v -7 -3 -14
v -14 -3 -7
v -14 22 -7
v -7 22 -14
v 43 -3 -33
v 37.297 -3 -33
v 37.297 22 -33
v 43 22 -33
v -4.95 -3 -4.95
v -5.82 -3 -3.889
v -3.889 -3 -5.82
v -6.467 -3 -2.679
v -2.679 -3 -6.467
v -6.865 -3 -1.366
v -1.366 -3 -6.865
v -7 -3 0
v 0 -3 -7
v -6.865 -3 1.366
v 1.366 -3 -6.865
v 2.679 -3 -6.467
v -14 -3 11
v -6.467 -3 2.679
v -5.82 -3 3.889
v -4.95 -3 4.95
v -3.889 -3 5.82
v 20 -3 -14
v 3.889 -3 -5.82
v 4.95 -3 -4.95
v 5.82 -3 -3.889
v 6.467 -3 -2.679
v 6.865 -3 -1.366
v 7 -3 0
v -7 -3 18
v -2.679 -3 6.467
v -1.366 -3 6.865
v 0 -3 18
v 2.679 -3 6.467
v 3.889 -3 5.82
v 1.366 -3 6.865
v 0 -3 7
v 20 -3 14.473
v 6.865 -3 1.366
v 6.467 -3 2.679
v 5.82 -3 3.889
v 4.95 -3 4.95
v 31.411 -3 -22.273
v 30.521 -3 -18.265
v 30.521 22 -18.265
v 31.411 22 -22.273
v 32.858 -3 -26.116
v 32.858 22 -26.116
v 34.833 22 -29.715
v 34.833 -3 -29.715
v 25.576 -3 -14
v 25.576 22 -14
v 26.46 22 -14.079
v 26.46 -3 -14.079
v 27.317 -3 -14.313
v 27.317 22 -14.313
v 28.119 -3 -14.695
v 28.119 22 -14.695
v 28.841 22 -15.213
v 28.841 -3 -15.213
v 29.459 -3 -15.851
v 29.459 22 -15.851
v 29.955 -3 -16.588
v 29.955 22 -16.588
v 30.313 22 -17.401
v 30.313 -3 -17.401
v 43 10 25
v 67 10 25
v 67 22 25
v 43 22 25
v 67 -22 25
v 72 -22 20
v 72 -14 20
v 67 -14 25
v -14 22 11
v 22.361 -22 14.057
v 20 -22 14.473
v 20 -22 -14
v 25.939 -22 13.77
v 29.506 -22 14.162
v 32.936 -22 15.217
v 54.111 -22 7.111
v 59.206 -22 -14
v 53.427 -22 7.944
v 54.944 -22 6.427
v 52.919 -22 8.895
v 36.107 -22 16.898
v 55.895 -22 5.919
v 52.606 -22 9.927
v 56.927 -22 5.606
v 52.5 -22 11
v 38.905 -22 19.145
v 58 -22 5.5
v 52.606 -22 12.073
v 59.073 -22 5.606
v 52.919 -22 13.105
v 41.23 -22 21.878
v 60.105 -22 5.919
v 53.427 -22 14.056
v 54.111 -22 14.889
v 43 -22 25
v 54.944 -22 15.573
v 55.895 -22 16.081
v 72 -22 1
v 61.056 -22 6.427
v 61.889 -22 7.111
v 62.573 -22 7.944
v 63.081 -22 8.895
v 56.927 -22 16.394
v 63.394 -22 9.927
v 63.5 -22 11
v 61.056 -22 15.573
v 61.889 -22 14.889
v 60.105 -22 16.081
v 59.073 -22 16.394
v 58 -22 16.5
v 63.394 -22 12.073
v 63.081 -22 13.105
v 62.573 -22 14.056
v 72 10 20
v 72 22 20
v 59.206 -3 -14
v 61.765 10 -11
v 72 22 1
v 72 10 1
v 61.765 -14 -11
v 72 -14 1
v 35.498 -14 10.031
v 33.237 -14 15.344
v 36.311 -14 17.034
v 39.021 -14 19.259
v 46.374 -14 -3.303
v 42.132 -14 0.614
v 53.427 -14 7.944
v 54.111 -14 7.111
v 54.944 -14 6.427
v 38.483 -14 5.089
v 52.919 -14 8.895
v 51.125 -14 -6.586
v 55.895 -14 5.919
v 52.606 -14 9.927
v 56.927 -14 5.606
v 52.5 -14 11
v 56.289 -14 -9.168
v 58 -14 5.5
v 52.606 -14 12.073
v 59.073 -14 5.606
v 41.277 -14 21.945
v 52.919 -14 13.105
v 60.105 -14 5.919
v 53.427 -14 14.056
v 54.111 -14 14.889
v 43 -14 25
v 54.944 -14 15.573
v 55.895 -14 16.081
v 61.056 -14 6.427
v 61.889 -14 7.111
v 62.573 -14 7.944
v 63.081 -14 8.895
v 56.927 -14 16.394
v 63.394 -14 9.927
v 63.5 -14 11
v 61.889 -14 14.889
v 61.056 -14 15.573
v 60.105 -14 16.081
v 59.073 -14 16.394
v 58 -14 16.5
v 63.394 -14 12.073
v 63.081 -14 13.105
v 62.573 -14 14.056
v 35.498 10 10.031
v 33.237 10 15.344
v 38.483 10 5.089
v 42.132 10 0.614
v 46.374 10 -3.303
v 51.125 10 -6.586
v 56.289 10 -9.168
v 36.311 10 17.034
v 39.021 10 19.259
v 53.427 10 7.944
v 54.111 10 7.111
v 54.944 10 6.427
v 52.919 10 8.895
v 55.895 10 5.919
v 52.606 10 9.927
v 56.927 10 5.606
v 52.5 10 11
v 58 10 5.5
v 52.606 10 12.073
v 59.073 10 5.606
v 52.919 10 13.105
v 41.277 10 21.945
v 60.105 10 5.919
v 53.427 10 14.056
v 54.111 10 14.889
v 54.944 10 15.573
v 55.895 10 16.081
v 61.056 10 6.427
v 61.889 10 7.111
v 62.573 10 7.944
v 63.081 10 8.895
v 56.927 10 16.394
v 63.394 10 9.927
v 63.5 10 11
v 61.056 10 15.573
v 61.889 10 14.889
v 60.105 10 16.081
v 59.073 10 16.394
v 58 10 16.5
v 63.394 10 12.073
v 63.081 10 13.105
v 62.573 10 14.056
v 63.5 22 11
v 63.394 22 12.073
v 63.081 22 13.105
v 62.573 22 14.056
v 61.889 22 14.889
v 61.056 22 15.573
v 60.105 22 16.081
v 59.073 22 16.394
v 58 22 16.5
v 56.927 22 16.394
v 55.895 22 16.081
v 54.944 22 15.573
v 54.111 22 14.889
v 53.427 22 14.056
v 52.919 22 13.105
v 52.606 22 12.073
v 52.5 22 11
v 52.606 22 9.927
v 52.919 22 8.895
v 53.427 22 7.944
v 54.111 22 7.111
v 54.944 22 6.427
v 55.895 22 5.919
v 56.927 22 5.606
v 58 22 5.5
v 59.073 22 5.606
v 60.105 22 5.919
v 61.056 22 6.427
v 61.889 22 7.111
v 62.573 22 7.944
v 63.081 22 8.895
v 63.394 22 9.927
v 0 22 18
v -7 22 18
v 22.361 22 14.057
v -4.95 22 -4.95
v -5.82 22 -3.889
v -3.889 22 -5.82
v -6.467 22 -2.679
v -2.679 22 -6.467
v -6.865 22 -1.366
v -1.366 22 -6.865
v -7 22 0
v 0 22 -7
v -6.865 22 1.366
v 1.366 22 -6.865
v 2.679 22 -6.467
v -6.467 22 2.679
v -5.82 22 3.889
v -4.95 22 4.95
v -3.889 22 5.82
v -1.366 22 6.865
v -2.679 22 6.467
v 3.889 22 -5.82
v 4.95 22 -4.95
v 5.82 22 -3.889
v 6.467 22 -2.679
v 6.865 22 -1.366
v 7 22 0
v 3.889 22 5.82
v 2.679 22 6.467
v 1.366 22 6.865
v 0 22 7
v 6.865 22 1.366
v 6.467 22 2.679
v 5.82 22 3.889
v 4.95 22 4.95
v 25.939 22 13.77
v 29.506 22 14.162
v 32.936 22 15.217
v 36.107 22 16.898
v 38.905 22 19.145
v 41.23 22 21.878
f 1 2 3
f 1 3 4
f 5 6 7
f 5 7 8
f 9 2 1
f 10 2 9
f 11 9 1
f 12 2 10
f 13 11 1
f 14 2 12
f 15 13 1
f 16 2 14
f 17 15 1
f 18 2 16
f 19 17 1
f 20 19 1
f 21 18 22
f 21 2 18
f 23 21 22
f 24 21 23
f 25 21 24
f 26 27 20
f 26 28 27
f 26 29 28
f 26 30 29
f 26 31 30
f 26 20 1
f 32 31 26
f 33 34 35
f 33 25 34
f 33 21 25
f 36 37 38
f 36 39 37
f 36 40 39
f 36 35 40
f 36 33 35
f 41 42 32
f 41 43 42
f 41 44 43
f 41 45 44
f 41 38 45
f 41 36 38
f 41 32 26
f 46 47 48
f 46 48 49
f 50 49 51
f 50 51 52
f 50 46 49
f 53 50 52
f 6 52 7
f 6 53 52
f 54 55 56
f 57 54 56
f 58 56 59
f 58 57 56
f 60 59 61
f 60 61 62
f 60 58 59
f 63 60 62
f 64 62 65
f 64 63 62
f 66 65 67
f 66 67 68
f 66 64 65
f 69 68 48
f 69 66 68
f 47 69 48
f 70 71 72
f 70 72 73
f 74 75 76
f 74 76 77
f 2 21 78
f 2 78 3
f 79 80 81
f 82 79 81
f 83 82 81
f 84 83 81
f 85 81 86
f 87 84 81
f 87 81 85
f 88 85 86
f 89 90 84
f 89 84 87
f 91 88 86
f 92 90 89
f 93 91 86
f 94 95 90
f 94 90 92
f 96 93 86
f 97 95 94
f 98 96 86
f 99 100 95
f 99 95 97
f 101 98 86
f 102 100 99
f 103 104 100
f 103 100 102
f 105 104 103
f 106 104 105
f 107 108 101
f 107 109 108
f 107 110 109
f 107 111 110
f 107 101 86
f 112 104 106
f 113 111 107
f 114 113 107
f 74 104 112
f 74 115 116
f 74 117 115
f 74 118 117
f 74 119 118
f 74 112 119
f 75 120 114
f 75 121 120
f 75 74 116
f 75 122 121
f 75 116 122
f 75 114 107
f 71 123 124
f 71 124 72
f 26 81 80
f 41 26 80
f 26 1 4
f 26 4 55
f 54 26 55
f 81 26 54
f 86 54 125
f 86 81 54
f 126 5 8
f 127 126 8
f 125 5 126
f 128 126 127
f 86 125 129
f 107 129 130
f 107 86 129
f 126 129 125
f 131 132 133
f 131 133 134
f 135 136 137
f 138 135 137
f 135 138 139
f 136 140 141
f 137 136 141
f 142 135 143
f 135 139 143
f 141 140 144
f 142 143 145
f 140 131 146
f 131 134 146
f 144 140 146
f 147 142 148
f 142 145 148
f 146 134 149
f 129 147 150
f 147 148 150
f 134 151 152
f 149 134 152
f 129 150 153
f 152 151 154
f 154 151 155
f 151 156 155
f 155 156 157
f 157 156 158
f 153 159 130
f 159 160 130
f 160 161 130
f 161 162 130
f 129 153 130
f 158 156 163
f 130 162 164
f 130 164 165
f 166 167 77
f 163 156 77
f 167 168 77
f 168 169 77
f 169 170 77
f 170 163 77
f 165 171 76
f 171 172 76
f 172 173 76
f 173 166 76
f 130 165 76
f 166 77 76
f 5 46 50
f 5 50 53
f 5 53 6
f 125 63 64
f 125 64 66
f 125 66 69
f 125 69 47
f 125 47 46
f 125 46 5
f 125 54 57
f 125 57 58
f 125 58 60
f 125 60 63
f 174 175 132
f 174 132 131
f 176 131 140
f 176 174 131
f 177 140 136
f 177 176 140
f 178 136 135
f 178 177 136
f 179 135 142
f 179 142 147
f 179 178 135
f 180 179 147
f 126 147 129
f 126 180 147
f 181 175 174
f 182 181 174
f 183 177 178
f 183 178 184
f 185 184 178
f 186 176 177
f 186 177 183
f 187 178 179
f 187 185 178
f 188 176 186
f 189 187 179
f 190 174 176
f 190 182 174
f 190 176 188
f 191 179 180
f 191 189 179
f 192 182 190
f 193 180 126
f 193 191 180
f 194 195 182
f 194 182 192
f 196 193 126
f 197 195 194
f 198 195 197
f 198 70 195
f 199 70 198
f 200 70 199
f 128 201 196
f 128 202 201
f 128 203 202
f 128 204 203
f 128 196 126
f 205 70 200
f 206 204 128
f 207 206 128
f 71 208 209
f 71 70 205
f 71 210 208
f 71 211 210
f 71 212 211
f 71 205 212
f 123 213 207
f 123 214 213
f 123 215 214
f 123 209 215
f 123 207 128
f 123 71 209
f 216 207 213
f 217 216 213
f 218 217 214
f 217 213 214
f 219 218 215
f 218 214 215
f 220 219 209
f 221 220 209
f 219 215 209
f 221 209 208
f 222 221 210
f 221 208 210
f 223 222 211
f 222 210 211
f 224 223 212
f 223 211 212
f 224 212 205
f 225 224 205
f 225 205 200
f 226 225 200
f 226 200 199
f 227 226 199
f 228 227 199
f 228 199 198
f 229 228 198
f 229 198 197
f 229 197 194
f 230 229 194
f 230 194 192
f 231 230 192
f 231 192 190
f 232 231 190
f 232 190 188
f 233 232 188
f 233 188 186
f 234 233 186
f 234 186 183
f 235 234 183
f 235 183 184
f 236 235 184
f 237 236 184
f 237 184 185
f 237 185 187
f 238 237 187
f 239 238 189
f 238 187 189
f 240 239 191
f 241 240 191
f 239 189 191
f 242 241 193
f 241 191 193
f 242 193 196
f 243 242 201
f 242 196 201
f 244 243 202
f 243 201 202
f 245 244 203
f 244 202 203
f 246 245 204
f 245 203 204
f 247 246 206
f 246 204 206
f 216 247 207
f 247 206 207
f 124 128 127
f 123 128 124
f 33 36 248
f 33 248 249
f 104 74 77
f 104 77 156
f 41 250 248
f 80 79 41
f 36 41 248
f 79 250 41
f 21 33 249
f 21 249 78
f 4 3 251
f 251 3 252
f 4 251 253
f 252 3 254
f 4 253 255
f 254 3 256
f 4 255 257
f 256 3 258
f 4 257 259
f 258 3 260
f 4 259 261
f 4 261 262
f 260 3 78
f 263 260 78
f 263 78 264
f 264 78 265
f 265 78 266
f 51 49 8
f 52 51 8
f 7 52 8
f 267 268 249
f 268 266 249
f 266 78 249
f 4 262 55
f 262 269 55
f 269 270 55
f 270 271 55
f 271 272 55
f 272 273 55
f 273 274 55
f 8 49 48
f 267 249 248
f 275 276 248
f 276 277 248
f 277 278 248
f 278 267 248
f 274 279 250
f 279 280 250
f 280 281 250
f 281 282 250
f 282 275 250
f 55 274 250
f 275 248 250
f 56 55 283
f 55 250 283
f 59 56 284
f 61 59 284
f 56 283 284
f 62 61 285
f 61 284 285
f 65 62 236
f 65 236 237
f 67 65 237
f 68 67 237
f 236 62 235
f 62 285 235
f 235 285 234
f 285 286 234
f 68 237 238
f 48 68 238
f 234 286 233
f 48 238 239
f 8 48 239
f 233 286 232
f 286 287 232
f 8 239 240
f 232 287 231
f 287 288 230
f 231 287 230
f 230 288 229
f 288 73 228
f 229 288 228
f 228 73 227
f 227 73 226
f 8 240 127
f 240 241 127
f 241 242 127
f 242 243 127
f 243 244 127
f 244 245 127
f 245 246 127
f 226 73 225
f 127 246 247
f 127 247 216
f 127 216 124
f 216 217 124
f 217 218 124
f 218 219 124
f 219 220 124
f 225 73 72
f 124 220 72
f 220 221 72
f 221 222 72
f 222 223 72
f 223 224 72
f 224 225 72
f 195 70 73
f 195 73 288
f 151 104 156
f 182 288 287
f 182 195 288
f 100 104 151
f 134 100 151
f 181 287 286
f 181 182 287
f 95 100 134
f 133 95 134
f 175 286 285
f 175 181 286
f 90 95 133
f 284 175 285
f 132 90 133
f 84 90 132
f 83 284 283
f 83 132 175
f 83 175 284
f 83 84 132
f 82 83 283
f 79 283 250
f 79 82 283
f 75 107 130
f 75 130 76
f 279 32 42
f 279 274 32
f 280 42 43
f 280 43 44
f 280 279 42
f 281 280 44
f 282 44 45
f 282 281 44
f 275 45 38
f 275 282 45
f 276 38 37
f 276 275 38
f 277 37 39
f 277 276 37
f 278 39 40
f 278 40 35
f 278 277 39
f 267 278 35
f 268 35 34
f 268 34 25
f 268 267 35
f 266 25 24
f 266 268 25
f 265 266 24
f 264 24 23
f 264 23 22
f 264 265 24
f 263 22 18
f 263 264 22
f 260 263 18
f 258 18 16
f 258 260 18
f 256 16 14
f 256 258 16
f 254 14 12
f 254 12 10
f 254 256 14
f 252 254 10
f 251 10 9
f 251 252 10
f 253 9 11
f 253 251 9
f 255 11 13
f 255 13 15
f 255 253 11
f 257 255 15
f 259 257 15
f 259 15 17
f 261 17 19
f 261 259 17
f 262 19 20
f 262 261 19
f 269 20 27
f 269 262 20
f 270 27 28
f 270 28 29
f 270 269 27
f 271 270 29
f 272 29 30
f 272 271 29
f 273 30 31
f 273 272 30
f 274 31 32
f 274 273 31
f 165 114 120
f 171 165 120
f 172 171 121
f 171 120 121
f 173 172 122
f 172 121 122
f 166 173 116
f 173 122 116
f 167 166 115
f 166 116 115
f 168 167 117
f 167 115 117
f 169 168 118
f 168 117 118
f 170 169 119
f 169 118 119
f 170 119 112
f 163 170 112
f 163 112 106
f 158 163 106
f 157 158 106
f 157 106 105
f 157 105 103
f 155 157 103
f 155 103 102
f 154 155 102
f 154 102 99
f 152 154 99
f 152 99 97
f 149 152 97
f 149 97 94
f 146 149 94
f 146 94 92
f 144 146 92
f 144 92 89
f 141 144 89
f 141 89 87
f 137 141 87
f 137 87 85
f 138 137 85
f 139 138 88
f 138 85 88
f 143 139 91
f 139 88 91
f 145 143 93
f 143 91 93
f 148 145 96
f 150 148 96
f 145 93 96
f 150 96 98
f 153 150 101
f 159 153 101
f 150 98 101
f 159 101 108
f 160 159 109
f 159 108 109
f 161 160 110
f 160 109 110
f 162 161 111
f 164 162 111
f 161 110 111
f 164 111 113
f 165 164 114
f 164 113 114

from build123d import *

# Parameters (mm, degrees)
F0_R     = 7
F1_DEPTH = 22
F2_R     = 7
F3_DEPTH = 19
F2_R_2   = 5.5
F4_DEPTH = 44.001
F7_DEPTH = 24


with BuildPart() as f1:
    # F0 (on Front) → F1 (new body, symmetric)
    with BuildSketch(Plane.XZ):
        with BuildLine():
            Line((-7, 18), (-14, 11))
            Line((-14, 11), (-14, -7))
            Line((-14, -7), (-7, -14))
            Line((-7, -14), (25.575539, -14))
            ThreePointArc((25.575539, -14), (28.840775, -15.213414), (30.521178, -18.264706))
            ThreePointArc((30.521178, -18.264706), (32.858008, -26.115672), (37.29698, -33))
            Line((37.29698, -33), (43, -33))
            Line((43, -33), (72, 1))
            Line((72, 1), (72, 20))
            Line((72, 20), (67, 25))
            Line((67, 25), (43, 25))
            ThreePointArc((43, 25), (34.561099, 15.982044), (22.361381, 14.057085))
            Line((22.361381, 14.057085), (0, 18))
            Line((0, 18), (-7, 18))
        make_face()
        Circle(F0_R, mode=Mode.SUBTRACT)
    extrude(amount=F1_DEPTH, both=True)

    # F2 (on face) → F3 (cut)
    with BuildSketch(Plane.XZ.offset(22)):
        Polygon((20, -14), (20, 14.47346), (0, 18), (-7, 18), (-14, 11), (-14, -7), (-7, -14), align=None)
        Circle(F2_R, mode=Mode.SUBTRACT)
        with BuildLine():
            Line((59.205882, -14), (25.575539, -14))
            ThreePointArc((25.575539, -14), (28.840775, -15.213414), (30.521178, -18.264706))
            ThreePointArc((30.521178, -18.264706), (32.858008, -26.115672), (37.29698, -33))
            Line((37.29698, -33), (43, -33))
            Line((43, -33), (59.205882, -14))
        make_face()
    extrude(amount=-F3_DEPTH, mode=Mode.SUBTRACT)

    # F2 (on face) → F4 (cut, through all)
    with BuildSketch(Plane.XZ.offset(22)):
        with Locations((58, 11)):
            Circle(F2_R_2)
    extrude(amount=-F4_DEPTH, mode=Mode.SUBTRACT)

    # F6 (on offset) → F7 (cut)
    with BuildSketch(Plane.XZ.offset(-10)):
        with BuildLine():
            Line((72, 25), (31.167462, 25))
            ThreePointArc((31.167462, 25), (40.759308, 2.149677), (61.764706, -11))
            Line((61.764706, -11), (72, 0))
            Line((72, 0), (72, 25))
        make_face()
    extrude(amount=F7_DEPTH, mode=Mode.SUBTRACT)


solid = f1.part
